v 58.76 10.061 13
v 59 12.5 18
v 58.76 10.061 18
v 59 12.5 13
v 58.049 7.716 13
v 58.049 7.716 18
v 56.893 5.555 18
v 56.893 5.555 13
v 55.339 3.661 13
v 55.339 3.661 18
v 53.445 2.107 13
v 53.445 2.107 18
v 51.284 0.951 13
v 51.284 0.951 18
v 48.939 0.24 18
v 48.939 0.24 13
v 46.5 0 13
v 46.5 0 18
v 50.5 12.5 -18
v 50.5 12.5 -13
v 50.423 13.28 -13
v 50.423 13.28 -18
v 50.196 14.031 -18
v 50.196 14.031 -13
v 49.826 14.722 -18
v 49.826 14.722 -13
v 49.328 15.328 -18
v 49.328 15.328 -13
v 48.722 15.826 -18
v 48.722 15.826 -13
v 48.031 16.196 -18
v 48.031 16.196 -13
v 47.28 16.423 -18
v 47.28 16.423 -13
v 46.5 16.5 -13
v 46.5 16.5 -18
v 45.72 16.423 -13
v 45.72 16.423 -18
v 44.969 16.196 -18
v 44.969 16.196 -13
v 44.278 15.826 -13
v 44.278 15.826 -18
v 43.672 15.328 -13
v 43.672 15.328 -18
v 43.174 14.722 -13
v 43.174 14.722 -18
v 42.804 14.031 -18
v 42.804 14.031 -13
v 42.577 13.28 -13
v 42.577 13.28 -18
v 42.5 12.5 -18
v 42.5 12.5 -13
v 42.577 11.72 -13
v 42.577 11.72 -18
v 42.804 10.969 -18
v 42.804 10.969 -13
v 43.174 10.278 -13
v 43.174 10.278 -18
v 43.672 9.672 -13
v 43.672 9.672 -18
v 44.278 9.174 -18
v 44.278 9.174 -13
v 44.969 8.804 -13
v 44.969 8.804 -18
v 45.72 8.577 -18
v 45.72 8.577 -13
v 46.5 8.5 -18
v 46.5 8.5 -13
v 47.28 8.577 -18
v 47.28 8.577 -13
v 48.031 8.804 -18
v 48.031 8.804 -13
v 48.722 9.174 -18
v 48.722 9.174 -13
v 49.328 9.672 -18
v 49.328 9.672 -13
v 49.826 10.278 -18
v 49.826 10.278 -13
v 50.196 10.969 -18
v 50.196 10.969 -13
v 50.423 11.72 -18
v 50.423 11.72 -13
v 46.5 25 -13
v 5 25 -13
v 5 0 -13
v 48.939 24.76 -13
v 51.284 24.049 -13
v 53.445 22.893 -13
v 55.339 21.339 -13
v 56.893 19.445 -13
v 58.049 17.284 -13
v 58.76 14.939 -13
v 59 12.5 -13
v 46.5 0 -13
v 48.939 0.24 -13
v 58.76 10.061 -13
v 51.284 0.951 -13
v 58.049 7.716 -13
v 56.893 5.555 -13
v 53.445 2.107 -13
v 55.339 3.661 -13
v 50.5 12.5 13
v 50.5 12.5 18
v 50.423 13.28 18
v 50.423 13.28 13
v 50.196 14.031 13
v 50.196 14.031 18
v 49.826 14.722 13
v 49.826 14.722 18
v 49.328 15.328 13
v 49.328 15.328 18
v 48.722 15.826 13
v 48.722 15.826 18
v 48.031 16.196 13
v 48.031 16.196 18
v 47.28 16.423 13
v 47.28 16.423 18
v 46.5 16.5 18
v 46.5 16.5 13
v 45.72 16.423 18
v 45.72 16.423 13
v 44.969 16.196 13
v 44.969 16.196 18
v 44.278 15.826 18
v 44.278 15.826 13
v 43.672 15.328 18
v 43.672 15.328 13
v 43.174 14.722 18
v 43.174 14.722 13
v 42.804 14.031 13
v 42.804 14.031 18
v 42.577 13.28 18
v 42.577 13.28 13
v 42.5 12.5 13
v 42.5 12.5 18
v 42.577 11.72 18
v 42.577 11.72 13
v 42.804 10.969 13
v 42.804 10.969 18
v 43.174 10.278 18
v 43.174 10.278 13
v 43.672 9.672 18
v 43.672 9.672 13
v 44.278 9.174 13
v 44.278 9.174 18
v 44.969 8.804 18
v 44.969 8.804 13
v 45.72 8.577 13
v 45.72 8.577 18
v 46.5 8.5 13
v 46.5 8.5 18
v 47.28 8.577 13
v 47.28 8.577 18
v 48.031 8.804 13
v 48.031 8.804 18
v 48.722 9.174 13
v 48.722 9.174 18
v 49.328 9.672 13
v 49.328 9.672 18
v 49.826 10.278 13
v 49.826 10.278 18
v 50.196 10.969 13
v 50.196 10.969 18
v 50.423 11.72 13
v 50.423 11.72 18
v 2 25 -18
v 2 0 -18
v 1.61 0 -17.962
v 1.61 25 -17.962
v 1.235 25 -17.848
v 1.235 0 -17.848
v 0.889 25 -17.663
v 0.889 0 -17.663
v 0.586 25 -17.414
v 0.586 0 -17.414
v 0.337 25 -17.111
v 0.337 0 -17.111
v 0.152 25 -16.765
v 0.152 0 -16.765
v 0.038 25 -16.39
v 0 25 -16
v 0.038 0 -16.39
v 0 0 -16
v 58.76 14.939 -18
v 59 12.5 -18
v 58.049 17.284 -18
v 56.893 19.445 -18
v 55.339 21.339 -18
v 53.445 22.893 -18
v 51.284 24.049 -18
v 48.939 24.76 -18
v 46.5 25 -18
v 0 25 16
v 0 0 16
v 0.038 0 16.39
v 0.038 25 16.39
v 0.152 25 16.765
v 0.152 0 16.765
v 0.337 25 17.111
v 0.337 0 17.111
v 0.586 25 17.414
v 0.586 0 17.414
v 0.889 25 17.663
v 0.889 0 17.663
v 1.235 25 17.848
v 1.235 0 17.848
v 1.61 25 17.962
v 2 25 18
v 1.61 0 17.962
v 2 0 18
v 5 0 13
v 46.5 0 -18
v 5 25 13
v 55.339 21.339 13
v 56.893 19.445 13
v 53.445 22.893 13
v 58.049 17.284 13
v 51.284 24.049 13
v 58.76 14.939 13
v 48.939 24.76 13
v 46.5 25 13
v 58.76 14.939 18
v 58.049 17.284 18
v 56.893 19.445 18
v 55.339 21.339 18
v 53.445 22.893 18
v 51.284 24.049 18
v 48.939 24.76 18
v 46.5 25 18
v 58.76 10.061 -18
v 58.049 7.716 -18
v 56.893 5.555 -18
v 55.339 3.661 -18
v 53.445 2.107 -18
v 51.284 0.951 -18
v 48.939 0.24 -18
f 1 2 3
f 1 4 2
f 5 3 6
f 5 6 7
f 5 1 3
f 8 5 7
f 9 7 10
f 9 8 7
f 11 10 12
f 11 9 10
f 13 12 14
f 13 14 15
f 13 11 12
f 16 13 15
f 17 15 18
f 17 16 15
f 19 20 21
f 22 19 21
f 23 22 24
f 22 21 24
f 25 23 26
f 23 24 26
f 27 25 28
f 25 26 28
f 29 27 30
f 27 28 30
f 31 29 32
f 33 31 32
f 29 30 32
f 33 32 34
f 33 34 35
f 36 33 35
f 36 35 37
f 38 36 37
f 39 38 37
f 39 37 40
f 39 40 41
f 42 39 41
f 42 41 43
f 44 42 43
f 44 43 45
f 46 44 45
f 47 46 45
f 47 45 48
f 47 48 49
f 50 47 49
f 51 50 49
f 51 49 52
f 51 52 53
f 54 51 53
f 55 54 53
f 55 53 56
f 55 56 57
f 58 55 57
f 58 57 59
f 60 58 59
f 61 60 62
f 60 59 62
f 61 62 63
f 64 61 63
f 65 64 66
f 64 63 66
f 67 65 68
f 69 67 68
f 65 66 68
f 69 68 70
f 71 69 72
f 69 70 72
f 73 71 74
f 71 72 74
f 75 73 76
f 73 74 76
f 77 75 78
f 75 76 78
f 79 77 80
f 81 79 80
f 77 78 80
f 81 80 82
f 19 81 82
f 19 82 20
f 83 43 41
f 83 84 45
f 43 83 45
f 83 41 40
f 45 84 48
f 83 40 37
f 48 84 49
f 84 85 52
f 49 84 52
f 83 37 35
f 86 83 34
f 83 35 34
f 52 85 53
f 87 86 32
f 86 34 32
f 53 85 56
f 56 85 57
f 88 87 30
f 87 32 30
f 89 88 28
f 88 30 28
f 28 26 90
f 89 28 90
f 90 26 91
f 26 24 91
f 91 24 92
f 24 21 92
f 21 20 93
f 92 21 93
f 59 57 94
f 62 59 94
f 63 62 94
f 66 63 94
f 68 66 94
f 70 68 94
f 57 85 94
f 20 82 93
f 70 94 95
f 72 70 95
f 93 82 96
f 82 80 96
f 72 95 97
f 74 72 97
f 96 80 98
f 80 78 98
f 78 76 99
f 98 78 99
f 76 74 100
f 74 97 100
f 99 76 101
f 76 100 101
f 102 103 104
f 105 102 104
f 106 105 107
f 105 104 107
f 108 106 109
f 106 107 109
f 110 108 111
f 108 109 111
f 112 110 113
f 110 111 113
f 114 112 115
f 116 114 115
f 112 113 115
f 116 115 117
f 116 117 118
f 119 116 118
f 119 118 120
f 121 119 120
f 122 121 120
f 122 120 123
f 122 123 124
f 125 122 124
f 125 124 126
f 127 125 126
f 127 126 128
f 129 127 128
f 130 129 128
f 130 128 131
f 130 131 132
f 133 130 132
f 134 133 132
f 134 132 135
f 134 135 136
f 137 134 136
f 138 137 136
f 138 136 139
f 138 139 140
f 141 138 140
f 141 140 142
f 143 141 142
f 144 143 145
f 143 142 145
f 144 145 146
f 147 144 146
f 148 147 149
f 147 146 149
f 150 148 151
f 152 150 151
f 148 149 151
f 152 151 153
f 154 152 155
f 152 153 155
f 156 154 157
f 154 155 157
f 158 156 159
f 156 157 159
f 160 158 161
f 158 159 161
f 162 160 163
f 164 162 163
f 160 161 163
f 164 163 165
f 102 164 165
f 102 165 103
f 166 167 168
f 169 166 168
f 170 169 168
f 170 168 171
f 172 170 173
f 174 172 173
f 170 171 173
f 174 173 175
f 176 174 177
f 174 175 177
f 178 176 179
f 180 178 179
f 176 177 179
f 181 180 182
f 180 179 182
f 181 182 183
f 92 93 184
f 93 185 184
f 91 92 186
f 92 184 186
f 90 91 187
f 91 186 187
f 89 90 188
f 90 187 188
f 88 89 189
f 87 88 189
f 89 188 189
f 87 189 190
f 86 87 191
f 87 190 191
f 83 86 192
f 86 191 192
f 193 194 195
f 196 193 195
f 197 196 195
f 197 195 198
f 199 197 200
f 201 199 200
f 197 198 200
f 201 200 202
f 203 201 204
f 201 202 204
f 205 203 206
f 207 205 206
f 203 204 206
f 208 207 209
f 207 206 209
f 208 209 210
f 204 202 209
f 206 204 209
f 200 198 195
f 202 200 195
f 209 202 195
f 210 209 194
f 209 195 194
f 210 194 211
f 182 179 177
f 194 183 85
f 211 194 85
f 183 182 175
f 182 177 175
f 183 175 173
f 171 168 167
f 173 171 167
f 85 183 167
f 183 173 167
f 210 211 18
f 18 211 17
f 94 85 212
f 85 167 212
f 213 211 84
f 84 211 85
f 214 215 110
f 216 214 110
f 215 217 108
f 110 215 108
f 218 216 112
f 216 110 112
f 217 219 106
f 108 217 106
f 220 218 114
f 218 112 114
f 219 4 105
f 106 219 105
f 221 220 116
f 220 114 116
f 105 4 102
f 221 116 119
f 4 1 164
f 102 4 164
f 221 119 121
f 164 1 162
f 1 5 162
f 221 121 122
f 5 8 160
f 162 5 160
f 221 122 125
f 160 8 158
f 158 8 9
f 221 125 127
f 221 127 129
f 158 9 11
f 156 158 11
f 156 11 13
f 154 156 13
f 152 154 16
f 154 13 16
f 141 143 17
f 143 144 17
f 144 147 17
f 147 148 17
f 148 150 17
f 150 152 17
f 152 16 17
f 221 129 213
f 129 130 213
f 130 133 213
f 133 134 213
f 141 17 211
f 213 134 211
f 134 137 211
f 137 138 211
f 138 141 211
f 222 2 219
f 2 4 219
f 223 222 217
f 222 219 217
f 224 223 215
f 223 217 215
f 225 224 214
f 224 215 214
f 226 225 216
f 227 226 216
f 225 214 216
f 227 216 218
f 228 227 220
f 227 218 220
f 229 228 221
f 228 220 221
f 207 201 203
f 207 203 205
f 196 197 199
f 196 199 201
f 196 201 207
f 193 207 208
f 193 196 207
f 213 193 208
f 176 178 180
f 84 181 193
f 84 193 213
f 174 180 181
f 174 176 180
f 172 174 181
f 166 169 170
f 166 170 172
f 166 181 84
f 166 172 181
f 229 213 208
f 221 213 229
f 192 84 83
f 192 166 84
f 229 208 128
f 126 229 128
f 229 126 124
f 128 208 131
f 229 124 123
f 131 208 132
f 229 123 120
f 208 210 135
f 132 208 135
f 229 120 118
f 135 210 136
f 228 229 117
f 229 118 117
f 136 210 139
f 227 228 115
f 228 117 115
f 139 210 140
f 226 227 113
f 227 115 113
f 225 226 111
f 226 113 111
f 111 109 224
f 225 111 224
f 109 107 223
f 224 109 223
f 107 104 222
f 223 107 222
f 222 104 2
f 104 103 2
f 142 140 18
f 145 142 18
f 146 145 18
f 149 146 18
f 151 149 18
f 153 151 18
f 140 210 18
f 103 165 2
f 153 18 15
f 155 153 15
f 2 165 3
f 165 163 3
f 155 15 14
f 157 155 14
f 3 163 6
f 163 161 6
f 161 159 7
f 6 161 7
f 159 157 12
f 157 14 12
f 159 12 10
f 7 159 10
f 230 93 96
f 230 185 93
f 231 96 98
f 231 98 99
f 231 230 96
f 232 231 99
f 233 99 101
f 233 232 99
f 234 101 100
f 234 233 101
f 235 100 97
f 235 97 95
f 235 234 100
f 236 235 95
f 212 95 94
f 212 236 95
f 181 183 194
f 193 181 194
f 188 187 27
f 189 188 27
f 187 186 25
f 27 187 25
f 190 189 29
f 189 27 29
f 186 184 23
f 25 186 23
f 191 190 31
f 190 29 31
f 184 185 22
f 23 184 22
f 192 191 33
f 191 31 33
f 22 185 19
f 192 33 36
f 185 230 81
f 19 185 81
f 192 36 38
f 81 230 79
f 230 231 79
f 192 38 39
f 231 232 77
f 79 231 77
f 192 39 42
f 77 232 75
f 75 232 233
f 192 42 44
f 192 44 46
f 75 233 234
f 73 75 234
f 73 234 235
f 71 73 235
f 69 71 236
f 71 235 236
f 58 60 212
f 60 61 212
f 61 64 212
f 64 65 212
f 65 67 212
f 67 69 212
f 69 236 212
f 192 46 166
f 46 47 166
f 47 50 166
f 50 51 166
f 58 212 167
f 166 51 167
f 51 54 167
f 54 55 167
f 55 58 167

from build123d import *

# Parameters (mm, degrees)
EXTRUDE_1_DEPTH     = 25
FILLET_1_R          = 12.5
SKETCH_2_R          = 4
CUT_EXTRUDE_1_DEPTH = 74.4982993


with BuildPart() as part:
    # Эскиз1 → Бобышка-Вытянуть1 (new body)
    with BuildSketch(Plane(origin=(0, 0, 0), x_dir=(1, 0, 0), z_dir=(0, 1, 0))):
        with BuildLine():
            Line((0, 16), (0, -16))
            ThreePointArc((0, -16), (0.585786438, -17.414213562), (2, -18))
            Line((2, -18), (59, -18))
            Line((59, -18), (59, -13))
            Line((59, -13), (5, -13))
            Line((5, -13), (5, 13))
            Line((5, 13), (59, 13))
            Line((59, 13), (59, 18))
            Line((59, 18), (2, 18))
            ThreePointArc((2, 18), (0.585786438, 17.414213562), (0, 16))
        make_face()
    extrude(amount=EXTRUDE_1_DEPTH)

    # Скругление1
    fillet_1_edges = [part.edges().sort_by_distance(p)[0] for p in [
        (59, 25, -15.5),
        (59, 0, -15.5),
        (59, 0, 15.5),
        (59, 25, 15.5),
    ]]
    fillet(fillet_1_edges, radius=FILLET_1_R - 0.0001)  # a hair under: the kernel refuses the full size

    # Эскиз2 → Вырез-Вытянуть1 (cut, through all)
    with BuildSketch(Plane.XY.offset(18)):
        with Locations((46.5, 12.5)):
            Circle(SKETCH_2_R)
    extrude(amount=-CUT_EXTRUDE_1_DEPTH, mode=Mode.SUBTRACT)


solid = part.part
